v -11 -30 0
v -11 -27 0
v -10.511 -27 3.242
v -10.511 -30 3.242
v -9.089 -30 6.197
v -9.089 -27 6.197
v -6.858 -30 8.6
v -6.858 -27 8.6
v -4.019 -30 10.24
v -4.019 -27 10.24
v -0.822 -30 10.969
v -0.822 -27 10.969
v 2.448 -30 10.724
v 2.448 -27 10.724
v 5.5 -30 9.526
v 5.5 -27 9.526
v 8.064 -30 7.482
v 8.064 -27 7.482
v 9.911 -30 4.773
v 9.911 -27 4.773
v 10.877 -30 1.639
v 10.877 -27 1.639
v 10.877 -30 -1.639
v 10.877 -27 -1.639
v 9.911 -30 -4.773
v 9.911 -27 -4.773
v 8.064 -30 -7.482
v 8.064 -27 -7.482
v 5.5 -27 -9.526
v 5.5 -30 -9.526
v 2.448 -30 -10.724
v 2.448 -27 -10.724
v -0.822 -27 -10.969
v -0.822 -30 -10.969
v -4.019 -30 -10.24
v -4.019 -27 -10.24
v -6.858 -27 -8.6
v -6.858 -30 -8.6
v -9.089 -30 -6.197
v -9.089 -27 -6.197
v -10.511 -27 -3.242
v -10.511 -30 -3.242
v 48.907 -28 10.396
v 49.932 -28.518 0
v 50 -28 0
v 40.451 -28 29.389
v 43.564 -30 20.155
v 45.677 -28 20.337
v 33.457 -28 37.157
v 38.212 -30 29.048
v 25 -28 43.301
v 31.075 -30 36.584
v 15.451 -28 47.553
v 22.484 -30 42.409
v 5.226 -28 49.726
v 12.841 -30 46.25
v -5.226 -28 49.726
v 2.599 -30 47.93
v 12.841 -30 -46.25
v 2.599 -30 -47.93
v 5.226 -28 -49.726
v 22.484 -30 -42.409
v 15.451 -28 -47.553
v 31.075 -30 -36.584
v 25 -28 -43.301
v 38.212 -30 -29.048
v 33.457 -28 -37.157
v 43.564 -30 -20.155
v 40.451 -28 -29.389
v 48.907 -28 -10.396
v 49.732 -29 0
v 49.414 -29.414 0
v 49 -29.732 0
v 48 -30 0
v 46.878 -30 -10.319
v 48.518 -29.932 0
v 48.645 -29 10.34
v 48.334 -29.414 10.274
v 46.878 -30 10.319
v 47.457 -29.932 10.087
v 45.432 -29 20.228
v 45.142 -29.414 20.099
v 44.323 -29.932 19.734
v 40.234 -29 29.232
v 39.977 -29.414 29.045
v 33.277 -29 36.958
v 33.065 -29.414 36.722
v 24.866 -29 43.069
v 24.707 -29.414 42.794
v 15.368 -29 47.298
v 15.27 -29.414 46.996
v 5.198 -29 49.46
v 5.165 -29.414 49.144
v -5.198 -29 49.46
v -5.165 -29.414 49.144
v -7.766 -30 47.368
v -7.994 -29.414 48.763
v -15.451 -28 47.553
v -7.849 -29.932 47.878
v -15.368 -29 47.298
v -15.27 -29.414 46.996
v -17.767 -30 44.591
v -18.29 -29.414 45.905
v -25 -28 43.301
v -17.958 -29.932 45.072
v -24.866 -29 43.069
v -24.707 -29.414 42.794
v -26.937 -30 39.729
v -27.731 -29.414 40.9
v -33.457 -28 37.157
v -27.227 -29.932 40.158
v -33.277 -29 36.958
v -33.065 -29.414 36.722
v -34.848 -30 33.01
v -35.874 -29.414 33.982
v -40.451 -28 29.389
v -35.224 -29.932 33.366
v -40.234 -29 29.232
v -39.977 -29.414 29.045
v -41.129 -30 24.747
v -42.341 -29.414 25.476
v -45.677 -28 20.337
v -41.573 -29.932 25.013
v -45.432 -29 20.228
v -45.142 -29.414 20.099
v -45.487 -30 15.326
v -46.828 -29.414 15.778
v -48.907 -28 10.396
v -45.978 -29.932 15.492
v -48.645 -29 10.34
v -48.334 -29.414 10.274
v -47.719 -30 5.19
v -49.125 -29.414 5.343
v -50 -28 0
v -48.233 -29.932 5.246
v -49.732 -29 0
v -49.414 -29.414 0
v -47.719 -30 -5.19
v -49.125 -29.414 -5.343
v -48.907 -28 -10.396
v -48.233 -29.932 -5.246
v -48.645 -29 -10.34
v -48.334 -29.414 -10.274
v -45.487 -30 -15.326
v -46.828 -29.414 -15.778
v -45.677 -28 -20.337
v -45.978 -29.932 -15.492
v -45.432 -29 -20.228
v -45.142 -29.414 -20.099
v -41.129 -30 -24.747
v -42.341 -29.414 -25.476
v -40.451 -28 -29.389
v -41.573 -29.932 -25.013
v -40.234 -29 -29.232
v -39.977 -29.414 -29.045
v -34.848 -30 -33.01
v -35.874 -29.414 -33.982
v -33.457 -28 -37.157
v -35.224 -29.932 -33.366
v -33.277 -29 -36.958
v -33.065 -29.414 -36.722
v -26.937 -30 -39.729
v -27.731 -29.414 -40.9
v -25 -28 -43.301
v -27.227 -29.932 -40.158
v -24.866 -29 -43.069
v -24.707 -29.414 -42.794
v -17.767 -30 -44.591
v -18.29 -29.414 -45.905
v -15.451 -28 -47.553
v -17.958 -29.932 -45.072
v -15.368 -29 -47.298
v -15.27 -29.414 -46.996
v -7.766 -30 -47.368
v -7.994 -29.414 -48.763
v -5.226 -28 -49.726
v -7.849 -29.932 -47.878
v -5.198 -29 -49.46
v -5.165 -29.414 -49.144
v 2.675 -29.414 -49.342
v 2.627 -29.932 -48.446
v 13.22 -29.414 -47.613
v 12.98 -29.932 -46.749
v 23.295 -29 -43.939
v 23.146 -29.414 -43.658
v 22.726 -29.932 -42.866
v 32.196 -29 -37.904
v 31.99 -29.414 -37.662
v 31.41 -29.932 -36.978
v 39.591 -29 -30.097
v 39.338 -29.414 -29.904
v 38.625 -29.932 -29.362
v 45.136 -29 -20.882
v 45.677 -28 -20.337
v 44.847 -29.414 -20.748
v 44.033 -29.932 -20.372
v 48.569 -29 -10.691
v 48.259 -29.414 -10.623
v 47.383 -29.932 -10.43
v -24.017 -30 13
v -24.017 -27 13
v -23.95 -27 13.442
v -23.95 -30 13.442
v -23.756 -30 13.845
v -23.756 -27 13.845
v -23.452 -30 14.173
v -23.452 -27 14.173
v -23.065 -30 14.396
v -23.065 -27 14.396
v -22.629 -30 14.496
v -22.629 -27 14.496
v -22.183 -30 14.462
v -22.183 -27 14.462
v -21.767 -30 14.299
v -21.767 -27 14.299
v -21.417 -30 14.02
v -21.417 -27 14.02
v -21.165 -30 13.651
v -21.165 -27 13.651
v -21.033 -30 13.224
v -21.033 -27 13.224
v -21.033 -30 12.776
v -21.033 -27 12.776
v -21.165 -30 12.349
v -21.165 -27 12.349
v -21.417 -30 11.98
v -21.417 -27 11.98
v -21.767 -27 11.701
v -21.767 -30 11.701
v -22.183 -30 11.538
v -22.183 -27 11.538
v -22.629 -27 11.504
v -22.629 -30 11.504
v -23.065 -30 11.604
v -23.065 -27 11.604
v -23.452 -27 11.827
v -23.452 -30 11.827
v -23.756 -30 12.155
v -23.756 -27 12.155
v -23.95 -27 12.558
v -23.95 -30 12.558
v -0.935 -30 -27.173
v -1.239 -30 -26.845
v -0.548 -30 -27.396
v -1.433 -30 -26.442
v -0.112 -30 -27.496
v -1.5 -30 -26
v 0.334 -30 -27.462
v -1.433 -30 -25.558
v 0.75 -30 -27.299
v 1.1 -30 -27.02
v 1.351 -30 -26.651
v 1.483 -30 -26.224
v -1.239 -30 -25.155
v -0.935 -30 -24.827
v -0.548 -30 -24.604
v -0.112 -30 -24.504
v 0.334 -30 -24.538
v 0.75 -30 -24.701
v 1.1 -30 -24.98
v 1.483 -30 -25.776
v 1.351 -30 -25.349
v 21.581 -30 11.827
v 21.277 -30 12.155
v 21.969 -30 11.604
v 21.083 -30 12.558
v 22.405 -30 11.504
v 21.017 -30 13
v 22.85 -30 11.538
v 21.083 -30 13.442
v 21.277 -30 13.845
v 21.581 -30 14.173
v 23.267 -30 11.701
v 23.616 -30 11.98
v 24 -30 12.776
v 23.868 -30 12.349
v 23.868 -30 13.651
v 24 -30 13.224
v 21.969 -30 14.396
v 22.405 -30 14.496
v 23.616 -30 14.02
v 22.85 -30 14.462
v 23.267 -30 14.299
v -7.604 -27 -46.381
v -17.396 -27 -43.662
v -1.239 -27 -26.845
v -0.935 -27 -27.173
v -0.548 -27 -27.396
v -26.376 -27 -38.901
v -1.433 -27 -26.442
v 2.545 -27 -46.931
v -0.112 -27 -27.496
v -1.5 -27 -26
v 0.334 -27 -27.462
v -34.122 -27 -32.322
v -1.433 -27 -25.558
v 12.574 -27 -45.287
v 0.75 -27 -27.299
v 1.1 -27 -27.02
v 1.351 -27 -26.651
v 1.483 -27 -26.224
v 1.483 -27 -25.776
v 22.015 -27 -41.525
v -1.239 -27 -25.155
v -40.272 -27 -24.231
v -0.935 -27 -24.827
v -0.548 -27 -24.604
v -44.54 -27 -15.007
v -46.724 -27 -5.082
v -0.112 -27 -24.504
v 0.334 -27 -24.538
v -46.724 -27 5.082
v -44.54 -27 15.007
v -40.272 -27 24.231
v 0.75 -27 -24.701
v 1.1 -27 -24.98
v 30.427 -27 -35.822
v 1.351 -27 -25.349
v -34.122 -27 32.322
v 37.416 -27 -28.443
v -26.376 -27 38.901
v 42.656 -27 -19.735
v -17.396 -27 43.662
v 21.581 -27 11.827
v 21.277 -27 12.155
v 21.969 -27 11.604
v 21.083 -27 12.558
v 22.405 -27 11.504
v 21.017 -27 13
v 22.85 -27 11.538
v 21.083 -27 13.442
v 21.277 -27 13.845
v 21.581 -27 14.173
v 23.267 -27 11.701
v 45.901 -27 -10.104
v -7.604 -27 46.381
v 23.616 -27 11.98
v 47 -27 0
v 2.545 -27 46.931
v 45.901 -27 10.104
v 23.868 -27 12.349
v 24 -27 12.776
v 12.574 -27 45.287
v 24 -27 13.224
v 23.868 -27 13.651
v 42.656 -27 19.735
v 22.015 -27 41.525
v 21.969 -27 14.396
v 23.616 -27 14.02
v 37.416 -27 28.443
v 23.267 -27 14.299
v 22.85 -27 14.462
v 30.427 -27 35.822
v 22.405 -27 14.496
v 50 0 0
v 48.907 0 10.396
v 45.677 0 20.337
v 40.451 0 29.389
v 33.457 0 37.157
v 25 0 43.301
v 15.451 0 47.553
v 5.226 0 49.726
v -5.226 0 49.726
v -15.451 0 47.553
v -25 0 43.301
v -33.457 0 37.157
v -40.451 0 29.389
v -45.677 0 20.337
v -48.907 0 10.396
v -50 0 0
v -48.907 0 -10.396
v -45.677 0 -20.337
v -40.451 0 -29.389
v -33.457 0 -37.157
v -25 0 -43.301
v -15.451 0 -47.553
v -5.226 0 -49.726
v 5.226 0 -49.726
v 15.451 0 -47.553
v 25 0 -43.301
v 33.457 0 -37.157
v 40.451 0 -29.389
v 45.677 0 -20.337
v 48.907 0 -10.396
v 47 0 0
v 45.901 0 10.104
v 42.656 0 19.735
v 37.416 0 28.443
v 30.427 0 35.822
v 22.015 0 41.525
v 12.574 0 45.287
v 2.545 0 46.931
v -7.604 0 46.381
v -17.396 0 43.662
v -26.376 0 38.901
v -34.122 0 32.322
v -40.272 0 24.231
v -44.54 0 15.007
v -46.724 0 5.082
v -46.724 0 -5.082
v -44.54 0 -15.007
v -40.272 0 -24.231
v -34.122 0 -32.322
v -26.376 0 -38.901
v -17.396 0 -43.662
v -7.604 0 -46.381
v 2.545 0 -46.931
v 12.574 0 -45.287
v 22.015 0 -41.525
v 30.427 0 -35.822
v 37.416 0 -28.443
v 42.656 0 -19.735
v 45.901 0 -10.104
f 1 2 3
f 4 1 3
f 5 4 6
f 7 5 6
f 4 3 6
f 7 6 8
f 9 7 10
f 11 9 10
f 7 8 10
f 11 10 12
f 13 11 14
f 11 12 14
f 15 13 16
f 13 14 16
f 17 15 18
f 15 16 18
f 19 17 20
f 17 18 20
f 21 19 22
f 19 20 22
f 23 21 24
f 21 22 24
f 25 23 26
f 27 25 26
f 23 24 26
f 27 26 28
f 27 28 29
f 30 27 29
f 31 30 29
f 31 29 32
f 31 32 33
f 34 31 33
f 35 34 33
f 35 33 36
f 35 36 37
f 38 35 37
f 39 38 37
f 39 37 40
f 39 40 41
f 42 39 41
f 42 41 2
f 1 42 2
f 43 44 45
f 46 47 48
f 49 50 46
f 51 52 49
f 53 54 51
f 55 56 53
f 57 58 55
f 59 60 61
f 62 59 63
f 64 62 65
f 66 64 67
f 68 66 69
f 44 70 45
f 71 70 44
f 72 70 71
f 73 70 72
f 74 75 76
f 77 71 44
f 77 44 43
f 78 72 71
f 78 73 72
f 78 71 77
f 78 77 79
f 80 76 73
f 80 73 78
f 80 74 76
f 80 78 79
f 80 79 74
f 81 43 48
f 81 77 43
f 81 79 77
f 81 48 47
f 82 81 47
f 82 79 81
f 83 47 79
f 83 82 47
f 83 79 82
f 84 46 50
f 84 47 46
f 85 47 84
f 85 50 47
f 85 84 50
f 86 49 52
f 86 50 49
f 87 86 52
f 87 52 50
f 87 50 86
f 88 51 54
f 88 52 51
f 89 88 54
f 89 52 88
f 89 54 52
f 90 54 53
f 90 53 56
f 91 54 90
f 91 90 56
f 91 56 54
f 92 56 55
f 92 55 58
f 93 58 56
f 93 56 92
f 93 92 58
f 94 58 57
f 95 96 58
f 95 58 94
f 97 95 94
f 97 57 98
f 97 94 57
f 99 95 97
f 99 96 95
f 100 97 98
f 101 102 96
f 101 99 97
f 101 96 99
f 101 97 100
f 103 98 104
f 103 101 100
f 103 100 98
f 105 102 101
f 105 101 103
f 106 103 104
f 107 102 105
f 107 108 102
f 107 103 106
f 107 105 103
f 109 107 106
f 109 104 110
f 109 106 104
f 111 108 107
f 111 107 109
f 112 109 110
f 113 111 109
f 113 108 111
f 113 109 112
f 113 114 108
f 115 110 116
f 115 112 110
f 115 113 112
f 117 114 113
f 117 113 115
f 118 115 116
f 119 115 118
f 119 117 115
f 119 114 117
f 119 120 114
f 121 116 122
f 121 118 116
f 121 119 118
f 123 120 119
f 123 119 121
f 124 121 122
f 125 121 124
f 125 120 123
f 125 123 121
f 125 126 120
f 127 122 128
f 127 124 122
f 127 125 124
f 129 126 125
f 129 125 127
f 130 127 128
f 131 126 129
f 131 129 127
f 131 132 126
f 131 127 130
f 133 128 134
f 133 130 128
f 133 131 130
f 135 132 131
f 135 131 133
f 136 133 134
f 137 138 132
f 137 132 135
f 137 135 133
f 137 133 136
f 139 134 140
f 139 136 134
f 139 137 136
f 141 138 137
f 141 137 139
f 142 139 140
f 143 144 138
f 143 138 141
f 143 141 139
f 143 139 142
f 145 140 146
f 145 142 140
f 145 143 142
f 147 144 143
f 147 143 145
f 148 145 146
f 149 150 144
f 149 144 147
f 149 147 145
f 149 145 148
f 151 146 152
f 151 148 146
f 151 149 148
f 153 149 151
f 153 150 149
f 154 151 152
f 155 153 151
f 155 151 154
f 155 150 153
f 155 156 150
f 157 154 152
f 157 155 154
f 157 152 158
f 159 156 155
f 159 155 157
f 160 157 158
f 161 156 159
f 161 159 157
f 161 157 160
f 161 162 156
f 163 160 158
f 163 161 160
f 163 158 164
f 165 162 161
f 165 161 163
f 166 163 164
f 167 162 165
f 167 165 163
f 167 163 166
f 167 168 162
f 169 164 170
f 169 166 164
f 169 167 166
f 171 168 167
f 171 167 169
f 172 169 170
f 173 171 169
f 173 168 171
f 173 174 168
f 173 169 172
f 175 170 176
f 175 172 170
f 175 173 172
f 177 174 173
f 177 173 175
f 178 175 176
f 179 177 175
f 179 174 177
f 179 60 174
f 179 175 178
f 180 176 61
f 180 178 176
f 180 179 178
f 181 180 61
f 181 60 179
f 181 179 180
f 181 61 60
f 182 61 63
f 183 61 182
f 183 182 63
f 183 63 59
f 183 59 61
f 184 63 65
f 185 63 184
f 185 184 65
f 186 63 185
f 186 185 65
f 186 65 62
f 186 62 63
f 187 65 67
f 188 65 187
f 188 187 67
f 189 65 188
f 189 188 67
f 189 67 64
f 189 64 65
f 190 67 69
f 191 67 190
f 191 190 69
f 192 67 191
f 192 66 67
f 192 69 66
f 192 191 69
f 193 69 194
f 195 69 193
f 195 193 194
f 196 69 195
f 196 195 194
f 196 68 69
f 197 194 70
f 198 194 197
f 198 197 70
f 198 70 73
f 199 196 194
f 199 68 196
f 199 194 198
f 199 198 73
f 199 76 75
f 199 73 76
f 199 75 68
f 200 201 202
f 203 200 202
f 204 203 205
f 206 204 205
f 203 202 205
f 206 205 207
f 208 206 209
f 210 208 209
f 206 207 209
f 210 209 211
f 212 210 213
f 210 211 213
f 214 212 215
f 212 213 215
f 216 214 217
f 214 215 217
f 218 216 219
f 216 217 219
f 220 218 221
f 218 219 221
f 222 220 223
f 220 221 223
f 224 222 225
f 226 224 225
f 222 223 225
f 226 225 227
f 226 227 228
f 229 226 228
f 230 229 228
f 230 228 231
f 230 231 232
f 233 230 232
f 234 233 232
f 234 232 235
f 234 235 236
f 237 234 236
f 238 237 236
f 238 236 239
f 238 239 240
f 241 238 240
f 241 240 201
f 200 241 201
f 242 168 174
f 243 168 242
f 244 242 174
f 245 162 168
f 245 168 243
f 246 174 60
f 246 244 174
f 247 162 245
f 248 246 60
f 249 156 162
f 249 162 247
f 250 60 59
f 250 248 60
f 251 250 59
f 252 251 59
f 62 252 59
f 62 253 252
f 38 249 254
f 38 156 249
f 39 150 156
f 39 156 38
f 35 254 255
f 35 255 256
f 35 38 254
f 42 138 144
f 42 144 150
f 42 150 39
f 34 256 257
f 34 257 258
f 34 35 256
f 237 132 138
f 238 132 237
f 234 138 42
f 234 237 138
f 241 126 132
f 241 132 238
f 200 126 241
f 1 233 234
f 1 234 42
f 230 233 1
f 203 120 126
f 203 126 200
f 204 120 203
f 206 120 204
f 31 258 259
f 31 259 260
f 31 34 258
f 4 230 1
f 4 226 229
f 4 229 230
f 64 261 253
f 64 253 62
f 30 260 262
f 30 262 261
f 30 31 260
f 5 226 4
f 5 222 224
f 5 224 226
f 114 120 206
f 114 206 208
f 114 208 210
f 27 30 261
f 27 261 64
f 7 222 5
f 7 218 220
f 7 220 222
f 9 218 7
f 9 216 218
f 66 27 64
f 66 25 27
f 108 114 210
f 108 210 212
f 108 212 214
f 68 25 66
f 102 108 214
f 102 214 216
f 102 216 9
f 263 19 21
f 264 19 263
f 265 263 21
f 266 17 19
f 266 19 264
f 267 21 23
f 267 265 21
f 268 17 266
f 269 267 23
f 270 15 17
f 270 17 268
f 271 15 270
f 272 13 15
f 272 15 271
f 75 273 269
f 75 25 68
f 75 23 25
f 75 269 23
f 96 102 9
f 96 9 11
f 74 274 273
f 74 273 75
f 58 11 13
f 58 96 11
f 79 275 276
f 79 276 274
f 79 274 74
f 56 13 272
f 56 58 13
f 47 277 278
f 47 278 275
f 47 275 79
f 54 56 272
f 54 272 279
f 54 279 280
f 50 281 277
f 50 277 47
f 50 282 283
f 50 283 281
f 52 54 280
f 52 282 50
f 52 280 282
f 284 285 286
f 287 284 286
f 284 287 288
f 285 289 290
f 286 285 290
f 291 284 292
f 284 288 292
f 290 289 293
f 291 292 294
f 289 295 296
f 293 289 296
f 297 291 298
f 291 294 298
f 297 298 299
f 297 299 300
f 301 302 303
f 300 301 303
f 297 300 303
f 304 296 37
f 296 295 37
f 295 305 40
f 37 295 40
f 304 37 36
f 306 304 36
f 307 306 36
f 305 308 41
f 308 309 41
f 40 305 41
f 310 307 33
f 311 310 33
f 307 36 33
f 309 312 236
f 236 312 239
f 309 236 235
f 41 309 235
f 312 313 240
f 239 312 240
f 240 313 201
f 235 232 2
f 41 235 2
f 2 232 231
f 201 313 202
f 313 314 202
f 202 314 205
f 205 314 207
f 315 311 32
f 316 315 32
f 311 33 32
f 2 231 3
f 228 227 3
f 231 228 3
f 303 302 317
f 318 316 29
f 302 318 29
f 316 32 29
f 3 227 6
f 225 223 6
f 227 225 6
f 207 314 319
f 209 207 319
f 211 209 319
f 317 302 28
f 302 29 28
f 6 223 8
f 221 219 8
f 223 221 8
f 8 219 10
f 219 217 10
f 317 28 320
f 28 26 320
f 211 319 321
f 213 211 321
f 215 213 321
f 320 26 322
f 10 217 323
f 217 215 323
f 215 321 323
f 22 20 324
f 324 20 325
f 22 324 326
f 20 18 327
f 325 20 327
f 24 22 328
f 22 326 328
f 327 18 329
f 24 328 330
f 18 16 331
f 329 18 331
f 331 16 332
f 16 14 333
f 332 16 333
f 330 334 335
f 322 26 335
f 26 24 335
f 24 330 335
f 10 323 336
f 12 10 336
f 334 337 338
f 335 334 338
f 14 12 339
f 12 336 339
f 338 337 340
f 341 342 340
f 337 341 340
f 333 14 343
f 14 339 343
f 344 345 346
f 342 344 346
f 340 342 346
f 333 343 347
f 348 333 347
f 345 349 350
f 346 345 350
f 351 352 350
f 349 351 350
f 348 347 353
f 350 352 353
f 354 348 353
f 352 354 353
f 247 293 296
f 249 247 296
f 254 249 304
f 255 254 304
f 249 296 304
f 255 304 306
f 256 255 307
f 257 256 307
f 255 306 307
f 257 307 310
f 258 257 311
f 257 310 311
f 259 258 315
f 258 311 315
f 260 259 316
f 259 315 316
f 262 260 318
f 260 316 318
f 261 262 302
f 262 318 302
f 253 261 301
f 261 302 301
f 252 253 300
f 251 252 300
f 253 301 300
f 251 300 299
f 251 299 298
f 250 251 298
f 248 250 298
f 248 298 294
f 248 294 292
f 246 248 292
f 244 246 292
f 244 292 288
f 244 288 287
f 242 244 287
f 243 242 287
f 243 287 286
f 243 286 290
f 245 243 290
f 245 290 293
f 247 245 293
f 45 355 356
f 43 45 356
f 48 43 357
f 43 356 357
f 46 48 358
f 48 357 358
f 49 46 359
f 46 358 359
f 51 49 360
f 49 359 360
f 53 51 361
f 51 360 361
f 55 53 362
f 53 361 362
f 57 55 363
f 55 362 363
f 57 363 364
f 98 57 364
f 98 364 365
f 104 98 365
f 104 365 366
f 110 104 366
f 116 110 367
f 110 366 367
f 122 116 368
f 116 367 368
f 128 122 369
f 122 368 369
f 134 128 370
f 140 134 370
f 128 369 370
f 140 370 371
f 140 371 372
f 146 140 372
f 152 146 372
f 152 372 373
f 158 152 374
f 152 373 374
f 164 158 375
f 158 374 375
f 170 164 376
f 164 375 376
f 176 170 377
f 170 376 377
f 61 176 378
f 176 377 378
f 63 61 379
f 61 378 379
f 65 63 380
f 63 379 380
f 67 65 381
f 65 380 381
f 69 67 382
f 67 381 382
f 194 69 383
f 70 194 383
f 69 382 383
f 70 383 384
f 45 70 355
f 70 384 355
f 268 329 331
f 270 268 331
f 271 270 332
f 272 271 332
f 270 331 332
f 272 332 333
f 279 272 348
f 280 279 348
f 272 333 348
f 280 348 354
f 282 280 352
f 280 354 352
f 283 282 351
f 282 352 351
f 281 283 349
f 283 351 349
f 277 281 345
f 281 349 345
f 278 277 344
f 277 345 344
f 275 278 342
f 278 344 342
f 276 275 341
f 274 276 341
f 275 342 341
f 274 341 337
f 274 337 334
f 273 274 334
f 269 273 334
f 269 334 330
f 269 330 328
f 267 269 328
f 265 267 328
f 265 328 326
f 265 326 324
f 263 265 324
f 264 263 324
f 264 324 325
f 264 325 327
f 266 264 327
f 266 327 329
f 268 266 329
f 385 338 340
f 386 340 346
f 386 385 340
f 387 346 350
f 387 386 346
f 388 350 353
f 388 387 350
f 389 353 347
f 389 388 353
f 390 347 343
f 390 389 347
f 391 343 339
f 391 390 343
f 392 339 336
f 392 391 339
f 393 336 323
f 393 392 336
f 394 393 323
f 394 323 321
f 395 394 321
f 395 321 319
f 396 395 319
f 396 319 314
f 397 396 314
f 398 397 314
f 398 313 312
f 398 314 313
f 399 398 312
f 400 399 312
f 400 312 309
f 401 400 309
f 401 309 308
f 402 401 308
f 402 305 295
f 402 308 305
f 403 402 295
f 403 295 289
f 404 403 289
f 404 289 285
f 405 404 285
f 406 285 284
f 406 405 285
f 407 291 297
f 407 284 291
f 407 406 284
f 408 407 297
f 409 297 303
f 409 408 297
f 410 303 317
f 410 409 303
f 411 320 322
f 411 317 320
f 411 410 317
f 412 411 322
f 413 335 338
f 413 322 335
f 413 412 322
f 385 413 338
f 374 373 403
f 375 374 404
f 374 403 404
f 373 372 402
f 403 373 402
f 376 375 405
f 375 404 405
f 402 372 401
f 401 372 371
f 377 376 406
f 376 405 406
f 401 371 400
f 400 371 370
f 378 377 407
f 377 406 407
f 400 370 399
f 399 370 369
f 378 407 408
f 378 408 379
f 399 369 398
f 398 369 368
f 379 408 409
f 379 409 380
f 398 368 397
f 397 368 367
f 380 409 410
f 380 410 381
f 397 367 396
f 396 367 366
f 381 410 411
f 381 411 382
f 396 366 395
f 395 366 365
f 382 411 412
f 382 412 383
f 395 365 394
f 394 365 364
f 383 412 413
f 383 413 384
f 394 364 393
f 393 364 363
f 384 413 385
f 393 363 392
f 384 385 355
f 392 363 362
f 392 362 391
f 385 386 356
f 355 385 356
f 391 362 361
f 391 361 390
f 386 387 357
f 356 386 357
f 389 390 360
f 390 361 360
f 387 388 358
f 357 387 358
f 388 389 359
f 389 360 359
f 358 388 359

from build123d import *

# Parameters (mm, degrees)
F0_R     = 50
F1_DEPTH = 30
F2_T     = -3
F3_R     = 2
F5_D     = 22
F7_D     = 3


with BuildPart() as f1:
    # F0 (on Front) → F1 (new body)
    with BuildSketch(Plane.XZ):
        Circle(F0_R)
    extrude(amount=F1_DEPTH)

    # F2
    f2_openings = [f1.faces().sort_by_distance(p)[0] for p in [
        (0, 0, 0),
    ]]
    offset(amount=F2_T, openings=f2_openings)

    # F3
    f3_edges = [f1.edges().sort_by_distance(p)[0] for p in [
        (-50, -30, 0),
    ]]
    fillet(f3_edges, radius=F3_R)

    # F5 (through all)
    with Locations(Plane.XZ.offset(30)):
        with Locations((0, 0)):
            Hole(F5_D / 2)

    # F7 (through all)
    with Locations(Plane.XZ.offset(30)):
        with Locations((0, -26), (-22.51666, 13), (22.51666, 13)):
            Hole(F7_D / 2)


solid = f1.part
